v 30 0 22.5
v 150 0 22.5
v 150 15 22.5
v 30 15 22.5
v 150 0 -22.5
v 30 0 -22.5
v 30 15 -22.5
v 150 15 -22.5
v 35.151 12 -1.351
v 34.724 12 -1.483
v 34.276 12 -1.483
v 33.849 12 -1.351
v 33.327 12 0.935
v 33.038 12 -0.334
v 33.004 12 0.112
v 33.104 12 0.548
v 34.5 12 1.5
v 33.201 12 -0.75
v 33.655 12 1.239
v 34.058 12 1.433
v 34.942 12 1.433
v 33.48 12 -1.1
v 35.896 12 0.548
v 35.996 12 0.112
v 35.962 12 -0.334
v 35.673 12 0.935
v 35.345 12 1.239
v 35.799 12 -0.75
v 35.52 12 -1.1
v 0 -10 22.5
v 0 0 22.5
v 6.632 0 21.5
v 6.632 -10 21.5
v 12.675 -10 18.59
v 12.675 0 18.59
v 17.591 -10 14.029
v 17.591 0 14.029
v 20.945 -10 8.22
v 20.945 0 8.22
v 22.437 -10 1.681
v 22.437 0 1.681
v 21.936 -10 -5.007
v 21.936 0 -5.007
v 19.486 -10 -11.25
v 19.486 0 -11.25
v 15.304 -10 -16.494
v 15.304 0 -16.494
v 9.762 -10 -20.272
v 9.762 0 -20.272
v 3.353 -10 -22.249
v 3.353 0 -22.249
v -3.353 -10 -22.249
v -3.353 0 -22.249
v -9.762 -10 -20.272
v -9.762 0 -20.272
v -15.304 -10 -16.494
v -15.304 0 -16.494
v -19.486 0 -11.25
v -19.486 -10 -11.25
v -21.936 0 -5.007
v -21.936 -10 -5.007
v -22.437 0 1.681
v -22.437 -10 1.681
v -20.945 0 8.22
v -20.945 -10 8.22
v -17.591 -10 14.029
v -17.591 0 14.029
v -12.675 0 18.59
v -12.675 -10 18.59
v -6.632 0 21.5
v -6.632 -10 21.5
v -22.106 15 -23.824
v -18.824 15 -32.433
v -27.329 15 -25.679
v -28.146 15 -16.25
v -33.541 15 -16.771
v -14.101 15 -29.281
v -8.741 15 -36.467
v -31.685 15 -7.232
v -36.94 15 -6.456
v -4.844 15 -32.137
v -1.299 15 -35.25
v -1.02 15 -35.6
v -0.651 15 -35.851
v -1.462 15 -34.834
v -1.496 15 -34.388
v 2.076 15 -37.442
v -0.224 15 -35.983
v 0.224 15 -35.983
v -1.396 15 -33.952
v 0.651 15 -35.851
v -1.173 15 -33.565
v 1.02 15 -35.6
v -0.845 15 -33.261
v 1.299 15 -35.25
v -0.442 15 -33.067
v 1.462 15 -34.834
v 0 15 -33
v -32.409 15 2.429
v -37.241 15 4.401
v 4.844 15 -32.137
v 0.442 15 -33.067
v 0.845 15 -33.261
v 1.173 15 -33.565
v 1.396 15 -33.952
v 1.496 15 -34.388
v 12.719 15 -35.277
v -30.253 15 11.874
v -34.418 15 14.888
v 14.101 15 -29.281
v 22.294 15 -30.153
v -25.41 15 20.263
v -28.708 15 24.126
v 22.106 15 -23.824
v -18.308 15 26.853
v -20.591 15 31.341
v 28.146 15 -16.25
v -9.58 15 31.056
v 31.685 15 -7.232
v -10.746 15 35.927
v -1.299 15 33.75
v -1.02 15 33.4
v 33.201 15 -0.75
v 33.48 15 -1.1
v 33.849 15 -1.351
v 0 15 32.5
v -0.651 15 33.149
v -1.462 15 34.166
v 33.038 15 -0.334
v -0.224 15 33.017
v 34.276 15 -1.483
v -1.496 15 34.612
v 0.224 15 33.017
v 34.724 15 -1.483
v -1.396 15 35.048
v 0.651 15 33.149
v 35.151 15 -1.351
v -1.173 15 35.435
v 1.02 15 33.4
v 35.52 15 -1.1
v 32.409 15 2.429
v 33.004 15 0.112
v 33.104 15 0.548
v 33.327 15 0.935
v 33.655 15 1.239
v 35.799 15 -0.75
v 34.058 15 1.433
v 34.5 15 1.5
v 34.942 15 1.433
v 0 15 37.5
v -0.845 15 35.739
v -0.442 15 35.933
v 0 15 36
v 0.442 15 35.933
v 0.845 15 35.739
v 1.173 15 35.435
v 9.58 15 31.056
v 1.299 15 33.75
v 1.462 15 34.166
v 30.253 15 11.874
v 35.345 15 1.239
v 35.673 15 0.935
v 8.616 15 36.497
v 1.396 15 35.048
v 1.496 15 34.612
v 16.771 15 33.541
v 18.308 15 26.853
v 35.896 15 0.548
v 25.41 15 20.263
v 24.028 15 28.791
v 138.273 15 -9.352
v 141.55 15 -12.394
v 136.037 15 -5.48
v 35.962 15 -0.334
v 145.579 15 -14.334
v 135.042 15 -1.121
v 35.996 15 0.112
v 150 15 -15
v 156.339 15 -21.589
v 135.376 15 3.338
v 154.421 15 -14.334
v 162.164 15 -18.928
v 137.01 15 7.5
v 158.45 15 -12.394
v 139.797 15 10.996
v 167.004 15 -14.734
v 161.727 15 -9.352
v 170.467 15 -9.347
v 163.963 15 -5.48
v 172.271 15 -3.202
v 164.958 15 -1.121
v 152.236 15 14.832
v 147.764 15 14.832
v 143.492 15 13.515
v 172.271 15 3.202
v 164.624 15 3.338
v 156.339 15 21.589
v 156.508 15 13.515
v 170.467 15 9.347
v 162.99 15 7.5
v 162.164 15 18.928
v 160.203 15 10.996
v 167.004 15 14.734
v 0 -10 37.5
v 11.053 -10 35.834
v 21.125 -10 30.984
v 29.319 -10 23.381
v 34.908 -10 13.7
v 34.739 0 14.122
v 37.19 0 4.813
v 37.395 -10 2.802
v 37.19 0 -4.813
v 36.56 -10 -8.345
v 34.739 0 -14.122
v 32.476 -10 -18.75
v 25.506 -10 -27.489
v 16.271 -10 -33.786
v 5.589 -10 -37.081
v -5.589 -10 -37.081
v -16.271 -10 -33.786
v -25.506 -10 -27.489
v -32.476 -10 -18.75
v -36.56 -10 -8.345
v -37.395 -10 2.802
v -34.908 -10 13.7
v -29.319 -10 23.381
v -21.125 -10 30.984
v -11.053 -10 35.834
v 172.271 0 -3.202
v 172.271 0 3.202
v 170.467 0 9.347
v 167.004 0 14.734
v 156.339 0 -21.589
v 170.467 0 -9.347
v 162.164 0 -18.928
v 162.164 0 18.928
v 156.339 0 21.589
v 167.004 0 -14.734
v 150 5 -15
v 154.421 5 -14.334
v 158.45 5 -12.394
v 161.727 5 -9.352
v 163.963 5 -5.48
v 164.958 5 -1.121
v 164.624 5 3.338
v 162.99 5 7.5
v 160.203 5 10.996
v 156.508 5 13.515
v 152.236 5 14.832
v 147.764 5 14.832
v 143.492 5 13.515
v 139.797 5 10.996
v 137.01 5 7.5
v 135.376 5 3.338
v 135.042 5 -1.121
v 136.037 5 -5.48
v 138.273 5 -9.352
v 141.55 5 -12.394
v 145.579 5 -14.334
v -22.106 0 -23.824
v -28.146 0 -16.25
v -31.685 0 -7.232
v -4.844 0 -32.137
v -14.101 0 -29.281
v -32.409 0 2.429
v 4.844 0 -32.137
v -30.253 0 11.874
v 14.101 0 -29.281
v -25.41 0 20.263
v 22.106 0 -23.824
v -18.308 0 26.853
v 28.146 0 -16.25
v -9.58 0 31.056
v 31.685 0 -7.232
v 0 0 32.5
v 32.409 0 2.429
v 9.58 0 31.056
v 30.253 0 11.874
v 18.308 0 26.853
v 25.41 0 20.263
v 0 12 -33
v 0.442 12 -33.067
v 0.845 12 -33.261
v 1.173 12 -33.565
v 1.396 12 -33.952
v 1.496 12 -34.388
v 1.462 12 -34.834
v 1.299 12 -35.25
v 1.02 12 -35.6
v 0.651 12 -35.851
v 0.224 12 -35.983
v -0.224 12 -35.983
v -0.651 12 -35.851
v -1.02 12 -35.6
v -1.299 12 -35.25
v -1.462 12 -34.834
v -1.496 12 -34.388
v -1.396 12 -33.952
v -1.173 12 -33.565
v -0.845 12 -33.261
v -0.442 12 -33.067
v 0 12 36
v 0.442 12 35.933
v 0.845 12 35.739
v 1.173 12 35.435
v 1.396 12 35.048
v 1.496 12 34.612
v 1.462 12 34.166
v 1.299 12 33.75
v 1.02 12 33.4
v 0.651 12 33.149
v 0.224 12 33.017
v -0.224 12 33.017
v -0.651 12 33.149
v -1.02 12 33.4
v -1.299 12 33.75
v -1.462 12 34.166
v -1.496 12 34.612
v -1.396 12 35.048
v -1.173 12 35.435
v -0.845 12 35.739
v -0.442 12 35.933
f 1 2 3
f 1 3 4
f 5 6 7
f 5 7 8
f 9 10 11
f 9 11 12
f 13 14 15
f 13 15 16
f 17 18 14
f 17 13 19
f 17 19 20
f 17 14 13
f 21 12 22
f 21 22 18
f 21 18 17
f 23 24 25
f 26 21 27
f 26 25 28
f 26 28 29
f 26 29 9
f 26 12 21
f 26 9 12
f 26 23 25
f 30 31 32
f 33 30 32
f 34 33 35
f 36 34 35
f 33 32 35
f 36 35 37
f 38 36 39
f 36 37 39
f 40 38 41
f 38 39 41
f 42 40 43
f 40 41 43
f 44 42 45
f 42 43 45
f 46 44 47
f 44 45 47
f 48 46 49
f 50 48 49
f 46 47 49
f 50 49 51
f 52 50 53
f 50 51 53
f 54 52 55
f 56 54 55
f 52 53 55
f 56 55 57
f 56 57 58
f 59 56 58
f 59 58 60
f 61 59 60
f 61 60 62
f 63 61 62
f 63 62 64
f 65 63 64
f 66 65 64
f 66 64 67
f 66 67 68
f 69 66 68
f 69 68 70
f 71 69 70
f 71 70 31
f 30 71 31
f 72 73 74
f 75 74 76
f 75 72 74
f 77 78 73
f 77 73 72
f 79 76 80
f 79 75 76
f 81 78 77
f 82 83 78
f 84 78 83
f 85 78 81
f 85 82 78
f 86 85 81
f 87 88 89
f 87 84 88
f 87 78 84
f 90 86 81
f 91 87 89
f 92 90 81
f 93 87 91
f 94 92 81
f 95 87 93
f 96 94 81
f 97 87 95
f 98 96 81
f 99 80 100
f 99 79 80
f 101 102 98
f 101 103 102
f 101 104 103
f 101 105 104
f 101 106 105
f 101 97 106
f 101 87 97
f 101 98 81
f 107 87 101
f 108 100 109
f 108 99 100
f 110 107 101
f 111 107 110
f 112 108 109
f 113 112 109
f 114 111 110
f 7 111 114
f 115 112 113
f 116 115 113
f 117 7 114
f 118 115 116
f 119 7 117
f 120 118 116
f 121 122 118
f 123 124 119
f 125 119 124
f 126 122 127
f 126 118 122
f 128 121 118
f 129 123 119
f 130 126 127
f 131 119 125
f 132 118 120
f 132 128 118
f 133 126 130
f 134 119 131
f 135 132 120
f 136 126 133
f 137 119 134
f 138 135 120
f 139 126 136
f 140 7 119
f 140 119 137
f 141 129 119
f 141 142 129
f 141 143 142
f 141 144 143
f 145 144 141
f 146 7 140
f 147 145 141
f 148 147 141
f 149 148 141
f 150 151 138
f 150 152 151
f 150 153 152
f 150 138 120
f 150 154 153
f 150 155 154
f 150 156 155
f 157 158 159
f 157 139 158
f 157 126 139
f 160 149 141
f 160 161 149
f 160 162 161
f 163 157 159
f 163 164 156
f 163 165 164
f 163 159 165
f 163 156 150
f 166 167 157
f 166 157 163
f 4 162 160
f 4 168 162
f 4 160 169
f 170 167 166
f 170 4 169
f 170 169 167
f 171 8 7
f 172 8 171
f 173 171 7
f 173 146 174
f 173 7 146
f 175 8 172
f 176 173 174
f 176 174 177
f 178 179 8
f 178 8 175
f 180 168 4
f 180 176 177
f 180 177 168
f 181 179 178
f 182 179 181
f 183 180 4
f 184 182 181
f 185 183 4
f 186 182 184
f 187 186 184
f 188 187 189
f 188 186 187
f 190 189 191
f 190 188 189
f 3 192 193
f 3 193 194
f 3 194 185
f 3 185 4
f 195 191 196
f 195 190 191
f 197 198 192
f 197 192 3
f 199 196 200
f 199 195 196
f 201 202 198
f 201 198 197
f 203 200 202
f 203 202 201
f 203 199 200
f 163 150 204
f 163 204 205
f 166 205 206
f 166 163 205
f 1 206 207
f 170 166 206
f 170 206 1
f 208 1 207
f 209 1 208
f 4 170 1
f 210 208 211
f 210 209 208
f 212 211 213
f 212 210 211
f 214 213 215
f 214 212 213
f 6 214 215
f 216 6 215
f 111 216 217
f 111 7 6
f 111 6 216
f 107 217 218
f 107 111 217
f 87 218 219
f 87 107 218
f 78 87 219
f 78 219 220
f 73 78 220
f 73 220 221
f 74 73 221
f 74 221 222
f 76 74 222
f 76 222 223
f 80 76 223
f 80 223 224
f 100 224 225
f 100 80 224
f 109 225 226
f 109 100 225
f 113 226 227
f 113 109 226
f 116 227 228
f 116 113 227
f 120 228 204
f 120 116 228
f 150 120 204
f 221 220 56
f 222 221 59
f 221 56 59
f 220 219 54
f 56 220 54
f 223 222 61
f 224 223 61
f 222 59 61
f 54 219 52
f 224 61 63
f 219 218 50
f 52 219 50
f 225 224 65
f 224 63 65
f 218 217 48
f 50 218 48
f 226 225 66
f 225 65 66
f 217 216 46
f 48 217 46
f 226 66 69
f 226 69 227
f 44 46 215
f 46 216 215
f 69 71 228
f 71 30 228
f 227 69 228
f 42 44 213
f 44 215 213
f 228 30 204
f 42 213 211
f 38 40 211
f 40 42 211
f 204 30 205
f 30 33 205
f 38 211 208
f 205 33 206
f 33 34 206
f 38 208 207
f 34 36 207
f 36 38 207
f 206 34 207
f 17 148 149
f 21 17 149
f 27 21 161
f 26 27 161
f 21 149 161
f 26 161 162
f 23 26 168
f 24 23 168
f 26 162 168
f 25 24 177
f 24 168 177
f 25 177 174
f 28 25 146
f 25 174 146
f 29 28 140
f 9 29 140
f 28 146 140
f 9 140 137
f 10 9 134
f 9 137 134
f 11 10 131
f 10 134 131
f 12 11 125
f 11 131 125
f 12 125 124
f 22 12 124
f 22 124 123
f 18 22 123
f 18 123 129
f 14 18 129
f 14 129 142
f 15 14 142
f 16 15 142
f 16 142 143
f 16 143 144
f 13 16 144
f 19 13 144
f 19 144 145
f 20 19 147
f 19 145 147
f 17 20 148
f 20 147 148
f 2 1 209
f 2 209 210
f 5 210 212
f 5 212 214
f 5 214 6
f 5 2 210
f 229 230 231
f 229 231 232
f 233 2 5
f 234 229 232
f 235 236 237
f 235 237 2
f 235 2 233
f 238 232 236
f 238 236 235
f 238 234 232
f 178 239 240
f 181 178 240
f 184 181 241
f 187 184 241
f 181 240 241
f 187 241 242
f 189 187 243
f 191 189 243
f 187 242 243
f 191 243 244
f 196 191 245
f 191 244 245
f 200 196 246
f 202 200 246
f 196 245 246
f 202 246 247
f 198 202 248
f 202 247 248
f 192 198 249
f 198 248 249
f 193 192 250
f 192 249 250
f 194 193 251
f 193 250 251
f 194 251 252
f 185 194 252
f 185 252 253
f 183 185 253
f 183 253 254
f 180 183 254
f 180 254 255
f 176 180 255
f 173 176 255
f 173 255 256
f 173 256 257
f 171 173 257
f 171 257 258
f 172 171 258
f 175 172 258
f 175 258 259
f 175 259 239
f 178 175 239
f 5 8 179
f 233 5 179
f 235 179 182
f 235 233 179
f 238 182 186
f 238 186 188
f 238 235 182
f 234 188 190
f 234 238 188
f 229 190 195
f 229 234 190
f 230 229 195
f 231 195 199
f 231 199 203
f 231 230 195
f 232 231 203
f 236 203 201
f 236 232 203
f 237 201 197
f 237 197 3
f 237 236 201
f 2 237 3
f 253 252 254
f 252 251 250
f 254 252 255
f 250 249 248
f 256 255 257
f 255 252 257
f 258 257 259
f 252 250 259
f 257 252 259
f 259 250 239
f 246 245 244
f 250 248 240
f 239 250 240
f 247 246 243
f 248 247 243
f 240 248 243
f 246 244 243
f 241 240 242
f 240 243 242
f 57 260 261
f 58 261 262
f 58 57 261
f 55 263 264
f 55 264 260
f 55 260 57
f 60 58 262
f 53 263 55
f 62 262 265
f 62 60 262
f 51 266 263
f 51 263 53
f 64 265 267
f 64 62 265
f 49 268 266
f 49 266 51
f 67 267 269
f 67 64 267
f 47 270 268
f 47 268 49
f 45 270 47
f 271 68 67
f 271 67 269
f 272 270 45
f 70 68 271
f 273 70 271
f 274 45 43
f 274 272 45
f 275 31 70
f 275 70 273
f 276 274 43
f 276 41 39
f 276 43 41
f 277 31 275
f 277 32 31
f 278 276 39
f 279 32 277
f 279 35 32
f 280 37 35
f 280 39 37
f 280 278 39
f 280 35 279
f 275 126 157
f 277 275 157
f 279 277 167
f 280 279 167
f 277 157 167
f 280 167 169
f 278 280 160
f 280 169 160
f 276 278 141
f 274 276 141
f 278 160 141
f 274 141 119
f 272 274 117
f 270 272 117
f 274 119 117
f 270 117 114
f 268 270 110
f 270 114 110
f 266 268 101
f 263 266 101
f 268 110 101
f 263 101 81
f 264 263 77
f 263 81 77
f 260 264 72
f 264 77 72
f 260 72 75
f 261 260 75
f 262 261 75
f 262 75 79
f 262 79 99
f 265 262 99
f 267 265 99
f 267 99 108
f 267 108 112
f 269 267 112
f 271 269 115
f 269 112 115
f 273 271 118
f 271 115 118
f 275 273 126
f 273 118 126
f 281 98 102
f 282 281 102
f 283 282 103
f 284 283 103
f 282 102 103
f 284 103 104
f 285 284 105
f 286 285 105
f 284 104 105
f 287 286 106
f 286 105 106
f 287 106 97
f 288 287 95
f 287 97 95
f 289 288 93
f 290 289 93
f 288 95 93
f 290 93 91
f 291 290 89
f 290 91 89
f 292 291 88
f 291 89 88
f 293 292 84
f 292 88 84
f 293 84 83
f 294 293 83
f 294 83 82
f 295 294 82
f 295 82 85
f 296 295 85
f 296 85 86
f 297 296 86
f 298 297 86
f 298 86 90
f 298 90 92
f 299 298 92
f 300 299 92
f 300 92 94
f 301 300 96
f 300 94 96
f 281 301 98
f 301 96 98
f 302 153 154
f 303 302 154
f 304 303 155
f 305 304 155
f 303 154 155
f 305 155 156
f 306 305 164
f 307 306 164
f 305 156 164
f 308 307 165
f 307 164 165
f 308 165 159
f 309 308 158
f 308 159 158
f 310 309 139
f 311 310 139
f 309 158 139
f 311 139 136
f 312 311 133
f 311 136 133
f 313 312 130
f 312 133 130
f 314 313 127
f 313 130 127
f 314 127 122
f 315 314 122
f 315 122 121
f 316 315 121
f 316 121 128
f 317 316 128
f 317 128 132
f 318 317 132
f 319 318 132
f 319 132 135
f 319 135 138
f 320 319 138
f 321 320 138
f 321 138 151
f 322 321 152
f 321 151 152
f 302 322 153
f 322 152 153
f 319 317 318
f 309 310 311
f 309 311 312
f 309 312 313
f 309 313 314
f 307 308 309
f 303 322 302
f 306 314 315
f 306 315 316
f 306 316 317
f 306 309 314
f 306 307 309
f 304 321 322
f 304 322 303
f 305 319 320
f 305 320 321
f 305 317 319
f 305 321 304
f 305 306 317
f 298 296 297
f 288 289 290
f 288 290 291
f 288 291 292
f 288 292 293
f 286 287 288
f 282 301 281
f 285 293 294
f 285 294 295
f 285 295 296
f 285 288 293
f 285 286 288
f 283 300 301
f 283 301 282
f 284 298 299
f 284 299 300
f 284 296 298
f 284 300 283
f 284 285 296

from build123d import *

# Parameters (mm, degrees)
BOSS_EXTRUDE1_DEPTH = 15
SKETCH4_R           = 37.5
BOSS_EXTRUDE2_DEPTH = 25
SKETCH5_R           = 22.5
CUT_EXTRUDE1_DEPTH  = 179.290493297
SKETCH6_R           = 32.5
CUT_EXTRUDE2_DEPTH  = 15
SKETCH7_R           = 15
CUT_EXTRUDE3_DEPTH  = 178.165177165
SKETCH9_R           = 15
BOSS_EXTRUDE3_DEPTH = 5
SKETCH10_R          = 1.5
CUT_EXTRUDE7_DEPTH  = 3


with BuildPart() as part:
    # Sketch2 → Boss-Extrude1 (new body)
    with BuildSketch(Plane(origin=(0, 0, 0), x_dir=(1, 0, 0), z_dir=(0, 1, 0))):
        with BuildLine():
            Line((0, 22.5), (150, 22.5))
            ThreePointArc((150, 22.5), (172.5, 0), (150, -22.5))
            Line((150, -22.5), (0, -22.5))
            ThreePointArc((0, -22.5), (-22.5, 0), (0, 22.5))
        make_face()
    extrude(amount=BOSS_EXTRUDE1_DEPTH)

    # Sketch4 → Boss-Extrude2 (add)
    with BuildSketch(Plane(origin=(0, 15, 0), x_dir=(1, 0, 0), z_dir=(0, 1, 0))):
        with Locations(Location((0, 0, 0), (0, 0, 270))):
            Circle(SKETCH4_R)
    extrude(amount=-BOSS_EXTRUDE2_DEPTH)

    # Sketch5 → Cut-Extrude1 (cut, through all)
    with BuildSketch(Plane(origin=(0, 15, 0), x_dir=(1, 0, 0), z_dir=(0, 1, 0))):
        with Locations(Location((0, 0, 0), (0, 0, 270))):
            Circle(SKETCH5_R)
    extrude(amount=-CUT_EXTRUDE1_DEPTH, mode=Mode.SUBTRACT)

    # Sketch6 → Cut-Extrude2 (cut)
    with BuildSketch(Plane(origin=(0, 15, 0), x_dir=(1, 0, 0), z_dir=(0, 1, 0))):
        with Locations(Location((0, 0, 0), (0, 0, 270))):
            Circle(SKETCH6_R)
    extrude(amount=-CUT_EXTRUDE2_DEPTH, mode=Mode.SUBTRACT)

    # Sketch7 → Cut-Extrude3 (cut, through all)
    with BuildSketch(Plane.XZ):
        with Locations(Location((150, 0, 0), (0, 0, 270))):
            Circle(SKETCH7_R)
    extrude(amount=-CUT_EXTRUDE3_DEPTH, mode=Mode.SUBTRACT)

    # Sketch9 → Boss-Extrude3 (add)
    with BuildSketch(Plane.XZ):
        with Locations(Location((150, 0, 0), (0, 0, 270))):
            Circle(SKETCH9_R)
    extrude(amount=-BOSS_EXTRUDE3_DEPTH)

    # Sketch10 → Cut-Extrude7 (cut)
    with BuildSketch(Plane(origin=(0, 15, 0), x_dir=(1, 0, 0), z_dir=(0, 1, 0))):
        with Locations(Location((0, -34.5, 0), (0, 0, 270))):
            Circle(SKETCH10_R)
        with Locations(Location((34.5, 0, 0), (0, 0, 270))):
            Circle(SKETCH10_R)
        with Locations(Location((0, 34.5, 0), (0, 0, 270))):
            Circle(SKETCH10_R)
    extrude(amount=-CUT_EXTRUDE7_DEPTH, mode=Mode.SUBTRACT)


solid = part.part
